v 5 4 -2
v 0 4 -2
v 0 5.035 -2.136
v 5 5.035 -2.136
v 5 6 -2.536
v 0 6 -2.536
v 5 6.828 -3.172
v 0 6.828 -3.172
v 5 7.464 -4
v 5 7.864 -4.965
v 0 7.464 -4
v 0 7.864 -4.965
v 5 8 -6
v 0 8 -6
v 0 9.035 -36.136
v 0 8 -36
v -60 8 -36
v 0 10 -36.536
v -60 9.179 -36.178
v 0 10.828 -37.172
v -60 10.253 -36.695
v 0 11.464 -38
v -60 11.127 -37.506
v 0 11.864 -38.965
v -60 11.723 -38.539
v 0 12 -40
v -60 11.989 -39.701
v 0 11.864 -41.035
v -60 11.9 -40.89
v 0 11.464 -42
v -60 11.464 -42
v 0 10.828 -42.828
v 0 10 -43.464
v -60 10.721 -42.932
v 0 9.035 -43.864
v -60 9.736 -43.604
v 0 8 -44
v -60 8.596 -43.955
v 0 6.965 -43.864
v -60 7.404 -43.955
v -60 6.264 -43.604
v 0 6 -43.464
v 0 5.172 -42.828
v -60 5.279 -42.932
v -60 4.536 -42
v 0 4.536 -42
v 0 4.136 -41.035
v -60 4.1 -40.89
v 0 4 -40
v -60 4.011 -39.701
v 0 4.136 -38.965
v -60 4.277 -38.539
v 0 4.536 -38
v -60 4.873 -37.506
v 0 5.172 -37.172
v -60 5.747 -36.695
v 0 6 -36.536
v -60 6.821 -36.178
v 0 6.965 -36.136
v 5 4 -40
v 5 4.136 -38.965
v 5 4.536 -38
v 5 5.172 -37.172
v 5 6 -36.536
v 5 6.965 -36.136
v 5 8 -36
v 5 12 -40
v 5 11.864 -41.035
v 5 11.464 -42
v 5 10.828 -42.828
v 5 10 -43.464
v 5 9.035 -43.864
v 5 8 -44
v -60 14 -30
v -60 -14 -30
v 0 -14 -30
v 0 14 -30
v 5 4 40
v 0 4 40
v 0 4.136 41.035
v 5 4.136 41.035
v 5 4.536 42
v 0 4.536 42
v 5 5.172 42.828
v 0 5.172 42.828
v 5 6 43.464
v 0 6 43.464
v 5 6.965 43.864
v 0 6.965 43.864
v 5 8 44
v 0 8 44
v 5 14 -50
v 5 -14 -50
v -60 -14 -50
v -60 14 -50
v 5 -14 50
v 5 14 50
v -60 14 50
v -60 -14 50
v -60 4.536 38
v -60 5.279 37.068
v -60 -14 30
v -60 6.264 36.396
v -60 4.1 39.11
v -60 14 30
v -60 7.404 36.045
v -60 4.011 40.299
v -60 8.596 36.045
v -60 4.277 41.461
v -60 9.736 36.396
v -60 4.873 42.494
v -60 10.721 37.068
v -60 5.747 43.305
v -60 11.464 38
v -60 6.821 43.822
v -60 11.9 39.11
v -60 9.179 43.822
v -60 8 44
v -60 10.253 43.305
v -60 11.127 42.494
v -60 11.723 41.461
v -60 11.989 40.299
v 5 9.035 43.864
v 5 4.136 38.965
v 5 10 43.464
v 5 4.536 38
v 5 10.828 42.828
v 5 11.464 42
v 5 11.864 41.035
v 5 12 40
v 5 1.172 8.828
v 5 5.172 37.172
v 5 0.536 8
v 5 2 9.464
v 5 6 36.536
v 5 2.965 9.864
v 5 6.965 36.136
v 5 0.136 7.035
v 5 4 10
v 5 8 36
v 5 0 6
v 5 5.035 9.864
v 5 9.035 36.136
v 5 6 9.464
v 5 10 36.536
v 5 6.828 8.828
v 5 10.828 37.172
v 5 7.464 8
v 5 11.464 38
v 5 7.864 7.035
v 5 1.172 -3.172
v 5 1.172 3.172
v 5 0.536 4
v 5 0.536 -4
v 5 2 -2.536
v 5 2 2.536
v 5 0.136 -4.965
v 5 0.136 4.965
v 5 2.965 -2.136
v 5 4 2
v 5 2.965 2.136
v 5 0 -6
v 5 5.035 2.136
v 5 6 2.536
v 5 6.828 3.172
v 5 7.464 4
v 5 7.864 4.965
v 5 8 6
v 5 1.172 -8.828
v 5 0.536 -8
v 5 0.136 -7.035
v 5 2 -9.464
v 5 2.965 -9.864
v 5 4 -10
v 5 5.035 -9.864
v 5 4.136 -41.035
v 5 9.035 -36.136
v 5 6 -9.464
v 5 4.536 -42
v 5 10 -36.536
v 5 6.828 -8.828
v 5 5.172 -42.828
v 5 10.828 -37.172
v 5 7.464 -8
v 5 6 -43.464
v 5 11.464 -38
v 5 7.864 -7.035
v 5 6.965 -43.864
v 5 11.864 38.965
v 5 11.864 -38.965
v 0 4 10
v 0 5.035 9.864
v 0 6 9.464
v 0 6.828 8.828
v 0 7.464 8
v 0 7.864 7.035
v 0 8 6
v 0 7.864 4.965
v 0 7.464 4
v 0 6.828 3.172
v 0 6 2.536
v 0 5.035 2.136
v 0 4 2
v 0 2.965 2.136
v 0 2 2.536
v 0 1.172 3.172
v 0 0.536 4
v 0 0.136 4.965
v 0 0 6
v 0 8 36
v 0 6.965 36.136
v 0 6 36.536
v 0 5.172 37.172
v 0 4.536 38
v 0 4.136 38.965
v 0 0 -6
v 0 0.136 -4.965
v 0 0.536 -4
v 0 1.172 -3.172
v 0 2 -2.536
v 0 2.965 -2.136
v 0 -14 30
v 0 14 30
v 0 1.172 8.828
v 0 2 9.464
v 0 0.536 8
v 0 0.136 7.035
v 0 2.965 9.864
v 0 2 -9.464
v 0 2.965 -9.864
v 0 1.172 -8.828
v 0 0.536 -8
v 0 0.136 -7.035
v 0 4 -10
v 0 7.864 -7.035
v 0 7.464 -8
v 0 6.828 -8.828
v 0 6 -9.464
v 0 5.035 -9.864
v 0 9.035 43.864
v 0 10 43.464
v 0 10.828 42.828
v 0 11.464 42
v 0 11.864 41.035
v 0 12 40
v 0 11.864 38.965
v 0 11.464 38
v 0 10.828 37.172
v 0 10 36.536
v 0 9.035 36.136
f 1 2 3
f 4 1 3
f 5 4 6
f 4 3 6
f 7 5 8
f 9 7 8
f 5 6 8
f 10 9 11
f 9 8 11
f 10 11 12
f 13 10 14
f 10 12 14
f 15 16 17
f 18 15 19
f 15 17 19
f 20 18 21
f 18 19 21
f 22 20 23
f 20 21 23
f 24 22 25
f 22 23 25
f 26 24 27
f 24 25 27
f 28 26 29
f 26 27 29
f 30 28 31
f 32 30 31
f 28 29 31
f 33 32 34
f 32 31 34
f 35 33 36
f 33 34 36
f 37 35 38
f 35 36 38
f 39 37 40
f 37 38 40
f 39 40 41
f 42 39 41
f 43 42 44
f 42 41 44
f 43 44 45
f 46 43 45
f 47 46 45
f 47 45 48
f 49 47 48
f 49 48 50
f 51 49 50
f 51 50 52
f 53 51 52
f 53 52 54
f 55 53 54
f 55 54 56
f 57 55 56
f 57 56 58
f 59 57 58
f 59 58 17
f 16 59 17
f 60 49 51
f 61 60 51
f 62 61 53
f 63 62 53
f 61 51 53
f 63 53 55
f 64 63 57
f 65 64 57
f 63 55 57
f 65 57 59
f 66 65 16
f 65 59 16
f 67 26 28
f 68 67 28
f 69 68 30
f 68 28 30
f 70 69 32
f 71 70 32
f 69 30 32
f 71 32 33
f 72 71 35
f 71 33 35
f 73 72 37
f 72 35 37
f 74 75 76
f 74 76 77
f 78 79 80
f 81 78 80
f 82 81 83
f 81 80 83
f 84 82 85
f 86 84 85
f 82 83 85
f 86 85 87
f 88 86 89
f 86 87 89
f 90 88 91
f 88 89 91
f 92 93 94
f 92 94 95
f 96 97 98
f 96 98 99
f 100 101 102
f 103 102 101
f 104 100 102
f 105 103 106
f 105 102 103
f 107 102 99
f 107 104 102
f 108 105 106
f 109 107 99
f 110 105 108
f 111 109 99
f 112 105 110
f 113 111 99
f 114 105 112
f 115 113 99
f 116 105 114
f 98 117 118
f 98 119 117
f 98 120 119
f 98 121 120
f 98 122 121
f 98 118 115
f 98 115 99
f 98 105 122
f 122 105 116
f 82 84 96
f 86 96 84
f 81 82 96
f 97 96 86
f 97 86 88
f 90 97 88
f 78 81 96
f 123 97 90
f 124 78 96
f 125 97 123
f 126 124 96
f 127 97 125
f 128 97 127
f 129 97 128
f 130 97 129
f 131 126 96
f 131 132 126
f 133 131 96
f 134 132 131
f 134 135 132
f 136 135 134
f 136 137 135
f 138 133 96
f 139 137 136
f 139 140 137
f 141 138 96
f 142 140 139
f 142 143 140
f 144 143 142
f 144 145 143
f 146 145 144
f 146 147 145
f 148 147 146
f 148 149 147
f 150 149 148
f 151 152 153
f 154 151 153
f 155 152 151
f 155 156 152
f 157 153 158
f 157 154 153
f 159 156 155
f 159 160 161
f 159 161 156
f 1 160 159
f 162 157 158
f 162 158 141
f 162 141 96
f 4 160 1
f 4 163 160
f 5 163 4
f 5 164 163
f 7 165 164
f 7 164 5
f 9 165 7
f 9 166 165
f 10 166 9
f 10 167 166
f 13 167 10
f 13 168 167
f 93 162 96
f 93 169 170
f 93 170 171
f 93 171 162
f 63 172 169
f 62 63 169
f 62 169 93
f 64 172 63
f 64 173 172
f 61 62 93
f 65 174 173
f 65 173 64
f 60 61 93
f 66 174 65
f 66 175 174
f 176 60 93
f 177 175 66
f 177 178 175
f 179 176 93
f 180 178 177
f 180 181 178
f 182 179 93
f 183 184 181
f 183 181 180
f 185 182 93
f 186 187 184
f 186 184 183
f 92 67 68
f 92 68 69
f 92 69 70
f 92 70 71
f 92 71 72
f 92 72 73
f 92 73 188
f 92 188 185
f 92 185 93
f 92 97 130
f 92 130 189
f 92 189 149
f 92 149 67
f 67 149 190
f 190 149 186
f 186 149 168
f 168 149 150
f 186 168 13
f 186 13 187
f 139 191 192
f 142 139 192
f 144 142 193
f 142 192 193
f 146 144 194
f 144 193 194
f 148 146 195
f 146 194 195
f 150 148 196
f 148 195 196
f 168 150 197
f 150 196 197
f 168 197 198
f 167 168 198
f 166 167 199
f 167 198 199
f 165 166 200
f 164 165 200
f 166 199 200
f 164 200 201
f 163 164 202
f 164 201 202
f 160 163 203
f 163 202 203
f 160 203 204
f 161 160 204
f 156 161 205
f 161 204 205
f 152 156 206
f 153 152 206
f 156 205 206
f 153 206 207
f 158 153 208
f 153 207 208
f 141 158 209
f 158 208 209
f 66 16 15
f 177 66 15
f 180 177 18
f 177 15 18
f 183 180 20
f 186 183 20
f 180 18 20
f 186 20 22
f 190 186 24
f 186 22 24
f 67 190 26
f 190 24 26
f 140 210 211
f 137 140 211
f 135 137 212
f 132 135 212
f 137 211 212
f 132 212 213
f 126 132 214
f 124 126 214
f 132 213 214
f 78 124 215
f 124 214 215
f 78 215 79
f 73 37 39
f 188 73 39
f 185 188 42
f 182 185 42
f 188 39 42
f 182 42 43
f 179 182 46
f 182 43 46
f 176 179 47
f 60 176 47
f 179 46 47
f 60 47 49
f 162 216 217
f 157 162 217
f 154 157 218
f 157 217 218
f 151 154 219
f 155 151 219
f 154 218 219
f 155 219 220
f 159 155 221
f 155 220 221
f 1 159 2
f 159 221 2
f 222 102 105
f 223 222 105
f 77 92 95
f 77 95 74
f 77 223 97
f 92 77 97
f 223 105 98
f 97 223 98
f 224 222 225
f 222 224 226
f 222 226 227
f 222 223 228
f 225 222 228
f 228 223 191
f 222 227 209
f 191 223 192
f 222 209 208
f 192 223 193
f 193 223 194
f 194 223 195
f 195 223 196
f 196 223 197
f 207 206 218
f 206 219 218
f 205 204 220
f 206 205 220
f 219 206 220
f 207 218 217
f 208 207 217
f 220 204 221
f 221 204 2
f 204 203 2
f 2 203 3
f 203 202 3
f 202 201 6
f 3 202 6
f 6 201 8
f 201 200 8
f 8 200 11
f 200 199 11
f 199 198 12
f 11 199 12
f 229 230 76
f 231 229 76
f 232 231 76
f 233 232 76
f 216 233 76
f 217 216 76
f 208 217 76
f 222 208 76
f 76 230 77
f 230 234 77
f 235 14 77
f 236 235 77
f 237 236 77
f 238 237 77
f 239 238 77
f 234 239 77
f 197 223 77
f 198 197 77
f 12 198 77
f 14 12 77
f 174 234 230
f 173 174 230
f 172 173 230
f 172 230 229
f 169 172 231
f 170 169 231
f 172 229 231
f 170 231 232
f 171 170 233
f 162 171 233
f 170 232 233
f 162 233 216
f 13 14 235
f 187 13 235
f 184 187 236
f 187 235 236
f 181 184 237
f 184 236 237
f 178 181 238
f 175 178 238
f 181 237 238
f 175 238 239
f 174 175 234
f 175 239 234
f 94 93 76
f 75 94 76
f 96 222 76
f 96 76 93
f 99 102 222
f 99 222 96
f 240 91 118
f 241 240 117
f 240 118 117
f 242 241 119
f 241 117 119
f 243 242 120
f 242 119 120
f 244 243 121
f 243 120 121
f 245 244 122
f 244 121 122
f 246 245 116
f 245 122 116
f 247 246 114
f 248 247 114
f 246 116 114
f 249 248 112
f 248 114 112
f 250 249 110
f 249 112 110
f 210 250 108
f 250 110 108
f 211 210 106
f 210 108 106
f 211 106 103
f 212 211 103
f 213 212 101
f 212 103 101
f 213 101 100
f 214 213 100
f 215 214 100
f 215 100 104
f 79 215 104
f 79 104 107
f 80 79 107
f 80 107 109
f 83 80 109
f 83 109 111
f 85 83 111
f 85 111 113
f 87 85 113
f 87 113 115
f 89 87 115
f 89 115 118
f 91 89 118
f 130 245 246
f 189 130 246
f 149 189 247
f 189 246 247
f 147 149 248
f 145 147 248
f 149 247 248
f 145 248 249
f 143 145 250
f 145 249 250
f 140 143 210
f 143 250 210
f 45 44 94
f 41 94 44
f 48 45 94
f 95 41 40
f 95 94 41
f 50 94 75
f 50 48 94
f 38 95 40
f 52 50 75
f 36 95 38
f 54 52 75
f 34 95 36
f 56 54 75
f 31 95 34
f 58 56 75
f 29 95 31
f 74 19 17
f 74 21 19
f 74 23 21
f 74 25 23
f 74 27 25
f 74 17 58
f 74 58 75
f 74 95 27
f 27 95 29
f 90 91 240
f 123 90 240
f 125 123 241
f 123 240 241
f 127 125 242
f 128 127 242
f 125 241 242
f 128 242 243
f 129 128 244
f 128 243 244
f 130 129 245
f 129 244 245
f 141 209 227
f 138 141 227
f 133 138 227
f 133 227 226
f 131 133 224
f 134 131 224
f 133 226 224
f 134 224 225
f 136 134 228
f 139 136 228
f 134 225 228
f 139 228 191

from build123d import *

# Parameters (mm, degrees)
SKETCH1_W           = 6
SKETCH1_H           = 6
SKETCH1_W_2         = 10
SKETCH1_H_2         = 4
SKETCH1_H_3         = 14
SKETCH1_W_3         = 34
BOSS_EXTRUDE1_DEPTH = 5
BOSS_EXTRUDE2_START = 60
SKETCH2_W           = 20
SKETCH2_H           = 28
SKETCH2_R           = 4
BOSS_EXTRUDE2_DEPTH = 60


with BuildPart() as part:
    # Sketch1 → Boss-Extrude1 (new body)
    with BuildSketch(Plane(origin=(0, 0, 0), x_dir=(0, 0, -1), z_dir=(1, 0, 0))):
        with BuildLine():
            ThreePointArc((40, 12), (42.828427125, 10.828427125), (44, 8))
            Line((44, 8), (50, 8))
            Line((50, 8), (50, 14))
            Line((50, 14), (40, 14))
            Line((40, 14), (40, 12))
        make_face()
        with BuildLine():
            Line((6, 14), (6, 8))
            Line((5.999999991, 8), (36, 8))
            ThreePointArc((36, 8), (37.171572875, 10.828427125), (40, 12))
            Line((40, 12), (40, 14))
            Line((40, 14), (6, 14))
        make_face()
        Polygon((0, 14), (0, 8), (5.999999991, 8), (6, 14), align=None)
        with Locations((-3, 11)):
            Rectangle(SKETCH1_W, SKETCH1_H)
        with BuildLine():
            ThreePointArc((-40, 12), (-37.171572875, 10.828427125), (-36, 8))
            Line((-36, 8), (-6.000000002, 8))
            Line((-6, 8), (-6, 14))
            Line((-6, 14), (-40, 14))
            Line((-40, 14), (-40, 12))
        make_face()
        with BuildLine():
            Line((-50, 14), (-50, 8))
            Line((-50, 8), (-44, 8))
            ThreePointArc((-44, 8), (-42.828427125, 10.828427125), (-40, 12))
            Line((-40, 12), (-40, 14))
            Line((-40, 14), (-50, 14))
        make_face()
        with BuildLine():
            Line((-50, 8), (-50, 4))
            Line((-50, 4), (-40, 4))
            ThreePointArc((-40, 4), (-42.828427125, 5.171572875), (-44, 8))
            Line((-44, 8), (-50, 8))
        make_face()
        with Locations((-45, 2)):
            Rectangle(SKETCH1_W_2, SKETCH1_H_2)
        with Locations((-45, -7)):
            Rectangle(SKETCH1_W_2, SKETCH1_H_3)
        with Locations((-23, -7)):
            Rectangle(SKETCH1_W_3, SKETCH1_H_3)
        with BuildLine():
            Line((-40, 4), (-40, 0))
            Line((-40, 0), (-6, 0))
            ThreePointArc((-6, 0), (-8.828427125, 1.171572875), (-10, 4))
            Line((-10, 4), (-40, 4))
        make_face()
        with BuildLine():
            ThreePointArc((-36, 8), (-37.171572875, 5.171572875), (-40, 4))
            Line((-40, 4), (-10, 4))
            ThreePointArc((-10, 4), (-8.828427126, 6.828427124), (-6.000000002, 8))
            Line((-6.000000002, 8), (-36, 8))
        make_face()
        with Locations((-3, -7)):
            Rectangle(SKETCH1_W, SKETCH1_H_3)
        with BuildLine():
            Line((0, 8), (0, 4))
            Line((0, 4), (2, 4))
            ThreePointArc((2, 4), (3.171572872, 6.828427122), (5.999999991, 8))
            Line((5.999999991, 8), (0, 8))
        make_face()
        with BuildLine():
            ThreePointArc((-6.000000002, 8), (-3.171572876, 6.828427126), (-2, 4))
            Line((-2, 4), (0, 4))
            Line((0, 4), (0, 8))
            Line((0, 8), (-6.000000002, 8))
        make_face()
        with Locations((3, -7)):
            Rectangle(SKETCH1_W, SKETCH1_H_3)
        with BuildLine():
            Line((0, 4), (0, 0))
            Line((0, 0), (6, 0))
            ThreePointArc((6, 0), (3.171572875, 1.171572875), (2, 4))
            Line((2, 4), (0, 4))
        make_face()
        with BuildLine():
            ThreePointArc((-2, 4), (-3.171572875, 1.171572875), (-6, 0))
            Line((-6, 0), (0, 0))
            Line((0, 0), (0, 4))
            Line((0, 4), (-2, 4))
        make_face()
        with BuildLine():
            ThreePointArc((10, 4), (8.828427125, 1.171572875), (6, 0))
            Line((6, 0), (40, 0))
            Line((40, 0), (40, 4))
            Line((39.999999991, 4), (10, 4))
        make_face()
        with BuildLine():
            ThreePointArc((5.999999991, 8), (8.828427122, 6.828427128), (10, 4))
            Line((10, 4), (39.999999991, 4))
            ThreePointArc((39.999999991, 4), (37.171572872, 5.171572878), (36, 8))
            Line((36, 8), (5.999999991, 8))
        make_face()
        with Locations((23, -7)):
            Rectangle(SKETCH1_W_3, SKETCH1_H_3)
        with Locations((45, -7)):
            Rectangle(SKETCH1_W_2, SKETCH1_H_3)
        with Locations((45, 2)):
            Rectangle(SKETCH1_W_2, SKETCH1_H_2)
        with BuildLine():
            ThreePointArc((44, 8), (42.828427122, 5.171572872), (39.999999991, 4))
            Line((39.999999991, 4), (50, 4))
            Line((50, 4), (50, 8))
            Line((50, 8), (44, 8))
        make_face()
    extrude(amount=BOSS_EXTRUDE1_DEPTH)

    # Sketch2 → Boss-Extrude2 (add)
    # profile 1 of 2: a face of its own
    with BuildSketch(Plane.ZY.offset(BOSS_EXTRUDE2_START)):
        with Locations((-40, 0)):
            Rectangle(SKETCH2_W, SKETCH2_H)
        with Locations((-40, 8)):
            Circle(SKETCH2_R, mode=Mode.SUBTRACT)
    # profile 2 of 2: a face of its own
    with BuildSketch(Plane.ZY.offset(BOSS_EXTRUDE2_START)):
        with Locations((40, 0)):
            Rectangle(SKETCH2_W, SKETCH2_H)
        with Locations((40, 8)):
            Circle(SKETCH2_R, mode=Mode.SUBTRACT)
    extrude(amount=-BOSS_EXTRUDE2_DEPTH)


solid = part.part
